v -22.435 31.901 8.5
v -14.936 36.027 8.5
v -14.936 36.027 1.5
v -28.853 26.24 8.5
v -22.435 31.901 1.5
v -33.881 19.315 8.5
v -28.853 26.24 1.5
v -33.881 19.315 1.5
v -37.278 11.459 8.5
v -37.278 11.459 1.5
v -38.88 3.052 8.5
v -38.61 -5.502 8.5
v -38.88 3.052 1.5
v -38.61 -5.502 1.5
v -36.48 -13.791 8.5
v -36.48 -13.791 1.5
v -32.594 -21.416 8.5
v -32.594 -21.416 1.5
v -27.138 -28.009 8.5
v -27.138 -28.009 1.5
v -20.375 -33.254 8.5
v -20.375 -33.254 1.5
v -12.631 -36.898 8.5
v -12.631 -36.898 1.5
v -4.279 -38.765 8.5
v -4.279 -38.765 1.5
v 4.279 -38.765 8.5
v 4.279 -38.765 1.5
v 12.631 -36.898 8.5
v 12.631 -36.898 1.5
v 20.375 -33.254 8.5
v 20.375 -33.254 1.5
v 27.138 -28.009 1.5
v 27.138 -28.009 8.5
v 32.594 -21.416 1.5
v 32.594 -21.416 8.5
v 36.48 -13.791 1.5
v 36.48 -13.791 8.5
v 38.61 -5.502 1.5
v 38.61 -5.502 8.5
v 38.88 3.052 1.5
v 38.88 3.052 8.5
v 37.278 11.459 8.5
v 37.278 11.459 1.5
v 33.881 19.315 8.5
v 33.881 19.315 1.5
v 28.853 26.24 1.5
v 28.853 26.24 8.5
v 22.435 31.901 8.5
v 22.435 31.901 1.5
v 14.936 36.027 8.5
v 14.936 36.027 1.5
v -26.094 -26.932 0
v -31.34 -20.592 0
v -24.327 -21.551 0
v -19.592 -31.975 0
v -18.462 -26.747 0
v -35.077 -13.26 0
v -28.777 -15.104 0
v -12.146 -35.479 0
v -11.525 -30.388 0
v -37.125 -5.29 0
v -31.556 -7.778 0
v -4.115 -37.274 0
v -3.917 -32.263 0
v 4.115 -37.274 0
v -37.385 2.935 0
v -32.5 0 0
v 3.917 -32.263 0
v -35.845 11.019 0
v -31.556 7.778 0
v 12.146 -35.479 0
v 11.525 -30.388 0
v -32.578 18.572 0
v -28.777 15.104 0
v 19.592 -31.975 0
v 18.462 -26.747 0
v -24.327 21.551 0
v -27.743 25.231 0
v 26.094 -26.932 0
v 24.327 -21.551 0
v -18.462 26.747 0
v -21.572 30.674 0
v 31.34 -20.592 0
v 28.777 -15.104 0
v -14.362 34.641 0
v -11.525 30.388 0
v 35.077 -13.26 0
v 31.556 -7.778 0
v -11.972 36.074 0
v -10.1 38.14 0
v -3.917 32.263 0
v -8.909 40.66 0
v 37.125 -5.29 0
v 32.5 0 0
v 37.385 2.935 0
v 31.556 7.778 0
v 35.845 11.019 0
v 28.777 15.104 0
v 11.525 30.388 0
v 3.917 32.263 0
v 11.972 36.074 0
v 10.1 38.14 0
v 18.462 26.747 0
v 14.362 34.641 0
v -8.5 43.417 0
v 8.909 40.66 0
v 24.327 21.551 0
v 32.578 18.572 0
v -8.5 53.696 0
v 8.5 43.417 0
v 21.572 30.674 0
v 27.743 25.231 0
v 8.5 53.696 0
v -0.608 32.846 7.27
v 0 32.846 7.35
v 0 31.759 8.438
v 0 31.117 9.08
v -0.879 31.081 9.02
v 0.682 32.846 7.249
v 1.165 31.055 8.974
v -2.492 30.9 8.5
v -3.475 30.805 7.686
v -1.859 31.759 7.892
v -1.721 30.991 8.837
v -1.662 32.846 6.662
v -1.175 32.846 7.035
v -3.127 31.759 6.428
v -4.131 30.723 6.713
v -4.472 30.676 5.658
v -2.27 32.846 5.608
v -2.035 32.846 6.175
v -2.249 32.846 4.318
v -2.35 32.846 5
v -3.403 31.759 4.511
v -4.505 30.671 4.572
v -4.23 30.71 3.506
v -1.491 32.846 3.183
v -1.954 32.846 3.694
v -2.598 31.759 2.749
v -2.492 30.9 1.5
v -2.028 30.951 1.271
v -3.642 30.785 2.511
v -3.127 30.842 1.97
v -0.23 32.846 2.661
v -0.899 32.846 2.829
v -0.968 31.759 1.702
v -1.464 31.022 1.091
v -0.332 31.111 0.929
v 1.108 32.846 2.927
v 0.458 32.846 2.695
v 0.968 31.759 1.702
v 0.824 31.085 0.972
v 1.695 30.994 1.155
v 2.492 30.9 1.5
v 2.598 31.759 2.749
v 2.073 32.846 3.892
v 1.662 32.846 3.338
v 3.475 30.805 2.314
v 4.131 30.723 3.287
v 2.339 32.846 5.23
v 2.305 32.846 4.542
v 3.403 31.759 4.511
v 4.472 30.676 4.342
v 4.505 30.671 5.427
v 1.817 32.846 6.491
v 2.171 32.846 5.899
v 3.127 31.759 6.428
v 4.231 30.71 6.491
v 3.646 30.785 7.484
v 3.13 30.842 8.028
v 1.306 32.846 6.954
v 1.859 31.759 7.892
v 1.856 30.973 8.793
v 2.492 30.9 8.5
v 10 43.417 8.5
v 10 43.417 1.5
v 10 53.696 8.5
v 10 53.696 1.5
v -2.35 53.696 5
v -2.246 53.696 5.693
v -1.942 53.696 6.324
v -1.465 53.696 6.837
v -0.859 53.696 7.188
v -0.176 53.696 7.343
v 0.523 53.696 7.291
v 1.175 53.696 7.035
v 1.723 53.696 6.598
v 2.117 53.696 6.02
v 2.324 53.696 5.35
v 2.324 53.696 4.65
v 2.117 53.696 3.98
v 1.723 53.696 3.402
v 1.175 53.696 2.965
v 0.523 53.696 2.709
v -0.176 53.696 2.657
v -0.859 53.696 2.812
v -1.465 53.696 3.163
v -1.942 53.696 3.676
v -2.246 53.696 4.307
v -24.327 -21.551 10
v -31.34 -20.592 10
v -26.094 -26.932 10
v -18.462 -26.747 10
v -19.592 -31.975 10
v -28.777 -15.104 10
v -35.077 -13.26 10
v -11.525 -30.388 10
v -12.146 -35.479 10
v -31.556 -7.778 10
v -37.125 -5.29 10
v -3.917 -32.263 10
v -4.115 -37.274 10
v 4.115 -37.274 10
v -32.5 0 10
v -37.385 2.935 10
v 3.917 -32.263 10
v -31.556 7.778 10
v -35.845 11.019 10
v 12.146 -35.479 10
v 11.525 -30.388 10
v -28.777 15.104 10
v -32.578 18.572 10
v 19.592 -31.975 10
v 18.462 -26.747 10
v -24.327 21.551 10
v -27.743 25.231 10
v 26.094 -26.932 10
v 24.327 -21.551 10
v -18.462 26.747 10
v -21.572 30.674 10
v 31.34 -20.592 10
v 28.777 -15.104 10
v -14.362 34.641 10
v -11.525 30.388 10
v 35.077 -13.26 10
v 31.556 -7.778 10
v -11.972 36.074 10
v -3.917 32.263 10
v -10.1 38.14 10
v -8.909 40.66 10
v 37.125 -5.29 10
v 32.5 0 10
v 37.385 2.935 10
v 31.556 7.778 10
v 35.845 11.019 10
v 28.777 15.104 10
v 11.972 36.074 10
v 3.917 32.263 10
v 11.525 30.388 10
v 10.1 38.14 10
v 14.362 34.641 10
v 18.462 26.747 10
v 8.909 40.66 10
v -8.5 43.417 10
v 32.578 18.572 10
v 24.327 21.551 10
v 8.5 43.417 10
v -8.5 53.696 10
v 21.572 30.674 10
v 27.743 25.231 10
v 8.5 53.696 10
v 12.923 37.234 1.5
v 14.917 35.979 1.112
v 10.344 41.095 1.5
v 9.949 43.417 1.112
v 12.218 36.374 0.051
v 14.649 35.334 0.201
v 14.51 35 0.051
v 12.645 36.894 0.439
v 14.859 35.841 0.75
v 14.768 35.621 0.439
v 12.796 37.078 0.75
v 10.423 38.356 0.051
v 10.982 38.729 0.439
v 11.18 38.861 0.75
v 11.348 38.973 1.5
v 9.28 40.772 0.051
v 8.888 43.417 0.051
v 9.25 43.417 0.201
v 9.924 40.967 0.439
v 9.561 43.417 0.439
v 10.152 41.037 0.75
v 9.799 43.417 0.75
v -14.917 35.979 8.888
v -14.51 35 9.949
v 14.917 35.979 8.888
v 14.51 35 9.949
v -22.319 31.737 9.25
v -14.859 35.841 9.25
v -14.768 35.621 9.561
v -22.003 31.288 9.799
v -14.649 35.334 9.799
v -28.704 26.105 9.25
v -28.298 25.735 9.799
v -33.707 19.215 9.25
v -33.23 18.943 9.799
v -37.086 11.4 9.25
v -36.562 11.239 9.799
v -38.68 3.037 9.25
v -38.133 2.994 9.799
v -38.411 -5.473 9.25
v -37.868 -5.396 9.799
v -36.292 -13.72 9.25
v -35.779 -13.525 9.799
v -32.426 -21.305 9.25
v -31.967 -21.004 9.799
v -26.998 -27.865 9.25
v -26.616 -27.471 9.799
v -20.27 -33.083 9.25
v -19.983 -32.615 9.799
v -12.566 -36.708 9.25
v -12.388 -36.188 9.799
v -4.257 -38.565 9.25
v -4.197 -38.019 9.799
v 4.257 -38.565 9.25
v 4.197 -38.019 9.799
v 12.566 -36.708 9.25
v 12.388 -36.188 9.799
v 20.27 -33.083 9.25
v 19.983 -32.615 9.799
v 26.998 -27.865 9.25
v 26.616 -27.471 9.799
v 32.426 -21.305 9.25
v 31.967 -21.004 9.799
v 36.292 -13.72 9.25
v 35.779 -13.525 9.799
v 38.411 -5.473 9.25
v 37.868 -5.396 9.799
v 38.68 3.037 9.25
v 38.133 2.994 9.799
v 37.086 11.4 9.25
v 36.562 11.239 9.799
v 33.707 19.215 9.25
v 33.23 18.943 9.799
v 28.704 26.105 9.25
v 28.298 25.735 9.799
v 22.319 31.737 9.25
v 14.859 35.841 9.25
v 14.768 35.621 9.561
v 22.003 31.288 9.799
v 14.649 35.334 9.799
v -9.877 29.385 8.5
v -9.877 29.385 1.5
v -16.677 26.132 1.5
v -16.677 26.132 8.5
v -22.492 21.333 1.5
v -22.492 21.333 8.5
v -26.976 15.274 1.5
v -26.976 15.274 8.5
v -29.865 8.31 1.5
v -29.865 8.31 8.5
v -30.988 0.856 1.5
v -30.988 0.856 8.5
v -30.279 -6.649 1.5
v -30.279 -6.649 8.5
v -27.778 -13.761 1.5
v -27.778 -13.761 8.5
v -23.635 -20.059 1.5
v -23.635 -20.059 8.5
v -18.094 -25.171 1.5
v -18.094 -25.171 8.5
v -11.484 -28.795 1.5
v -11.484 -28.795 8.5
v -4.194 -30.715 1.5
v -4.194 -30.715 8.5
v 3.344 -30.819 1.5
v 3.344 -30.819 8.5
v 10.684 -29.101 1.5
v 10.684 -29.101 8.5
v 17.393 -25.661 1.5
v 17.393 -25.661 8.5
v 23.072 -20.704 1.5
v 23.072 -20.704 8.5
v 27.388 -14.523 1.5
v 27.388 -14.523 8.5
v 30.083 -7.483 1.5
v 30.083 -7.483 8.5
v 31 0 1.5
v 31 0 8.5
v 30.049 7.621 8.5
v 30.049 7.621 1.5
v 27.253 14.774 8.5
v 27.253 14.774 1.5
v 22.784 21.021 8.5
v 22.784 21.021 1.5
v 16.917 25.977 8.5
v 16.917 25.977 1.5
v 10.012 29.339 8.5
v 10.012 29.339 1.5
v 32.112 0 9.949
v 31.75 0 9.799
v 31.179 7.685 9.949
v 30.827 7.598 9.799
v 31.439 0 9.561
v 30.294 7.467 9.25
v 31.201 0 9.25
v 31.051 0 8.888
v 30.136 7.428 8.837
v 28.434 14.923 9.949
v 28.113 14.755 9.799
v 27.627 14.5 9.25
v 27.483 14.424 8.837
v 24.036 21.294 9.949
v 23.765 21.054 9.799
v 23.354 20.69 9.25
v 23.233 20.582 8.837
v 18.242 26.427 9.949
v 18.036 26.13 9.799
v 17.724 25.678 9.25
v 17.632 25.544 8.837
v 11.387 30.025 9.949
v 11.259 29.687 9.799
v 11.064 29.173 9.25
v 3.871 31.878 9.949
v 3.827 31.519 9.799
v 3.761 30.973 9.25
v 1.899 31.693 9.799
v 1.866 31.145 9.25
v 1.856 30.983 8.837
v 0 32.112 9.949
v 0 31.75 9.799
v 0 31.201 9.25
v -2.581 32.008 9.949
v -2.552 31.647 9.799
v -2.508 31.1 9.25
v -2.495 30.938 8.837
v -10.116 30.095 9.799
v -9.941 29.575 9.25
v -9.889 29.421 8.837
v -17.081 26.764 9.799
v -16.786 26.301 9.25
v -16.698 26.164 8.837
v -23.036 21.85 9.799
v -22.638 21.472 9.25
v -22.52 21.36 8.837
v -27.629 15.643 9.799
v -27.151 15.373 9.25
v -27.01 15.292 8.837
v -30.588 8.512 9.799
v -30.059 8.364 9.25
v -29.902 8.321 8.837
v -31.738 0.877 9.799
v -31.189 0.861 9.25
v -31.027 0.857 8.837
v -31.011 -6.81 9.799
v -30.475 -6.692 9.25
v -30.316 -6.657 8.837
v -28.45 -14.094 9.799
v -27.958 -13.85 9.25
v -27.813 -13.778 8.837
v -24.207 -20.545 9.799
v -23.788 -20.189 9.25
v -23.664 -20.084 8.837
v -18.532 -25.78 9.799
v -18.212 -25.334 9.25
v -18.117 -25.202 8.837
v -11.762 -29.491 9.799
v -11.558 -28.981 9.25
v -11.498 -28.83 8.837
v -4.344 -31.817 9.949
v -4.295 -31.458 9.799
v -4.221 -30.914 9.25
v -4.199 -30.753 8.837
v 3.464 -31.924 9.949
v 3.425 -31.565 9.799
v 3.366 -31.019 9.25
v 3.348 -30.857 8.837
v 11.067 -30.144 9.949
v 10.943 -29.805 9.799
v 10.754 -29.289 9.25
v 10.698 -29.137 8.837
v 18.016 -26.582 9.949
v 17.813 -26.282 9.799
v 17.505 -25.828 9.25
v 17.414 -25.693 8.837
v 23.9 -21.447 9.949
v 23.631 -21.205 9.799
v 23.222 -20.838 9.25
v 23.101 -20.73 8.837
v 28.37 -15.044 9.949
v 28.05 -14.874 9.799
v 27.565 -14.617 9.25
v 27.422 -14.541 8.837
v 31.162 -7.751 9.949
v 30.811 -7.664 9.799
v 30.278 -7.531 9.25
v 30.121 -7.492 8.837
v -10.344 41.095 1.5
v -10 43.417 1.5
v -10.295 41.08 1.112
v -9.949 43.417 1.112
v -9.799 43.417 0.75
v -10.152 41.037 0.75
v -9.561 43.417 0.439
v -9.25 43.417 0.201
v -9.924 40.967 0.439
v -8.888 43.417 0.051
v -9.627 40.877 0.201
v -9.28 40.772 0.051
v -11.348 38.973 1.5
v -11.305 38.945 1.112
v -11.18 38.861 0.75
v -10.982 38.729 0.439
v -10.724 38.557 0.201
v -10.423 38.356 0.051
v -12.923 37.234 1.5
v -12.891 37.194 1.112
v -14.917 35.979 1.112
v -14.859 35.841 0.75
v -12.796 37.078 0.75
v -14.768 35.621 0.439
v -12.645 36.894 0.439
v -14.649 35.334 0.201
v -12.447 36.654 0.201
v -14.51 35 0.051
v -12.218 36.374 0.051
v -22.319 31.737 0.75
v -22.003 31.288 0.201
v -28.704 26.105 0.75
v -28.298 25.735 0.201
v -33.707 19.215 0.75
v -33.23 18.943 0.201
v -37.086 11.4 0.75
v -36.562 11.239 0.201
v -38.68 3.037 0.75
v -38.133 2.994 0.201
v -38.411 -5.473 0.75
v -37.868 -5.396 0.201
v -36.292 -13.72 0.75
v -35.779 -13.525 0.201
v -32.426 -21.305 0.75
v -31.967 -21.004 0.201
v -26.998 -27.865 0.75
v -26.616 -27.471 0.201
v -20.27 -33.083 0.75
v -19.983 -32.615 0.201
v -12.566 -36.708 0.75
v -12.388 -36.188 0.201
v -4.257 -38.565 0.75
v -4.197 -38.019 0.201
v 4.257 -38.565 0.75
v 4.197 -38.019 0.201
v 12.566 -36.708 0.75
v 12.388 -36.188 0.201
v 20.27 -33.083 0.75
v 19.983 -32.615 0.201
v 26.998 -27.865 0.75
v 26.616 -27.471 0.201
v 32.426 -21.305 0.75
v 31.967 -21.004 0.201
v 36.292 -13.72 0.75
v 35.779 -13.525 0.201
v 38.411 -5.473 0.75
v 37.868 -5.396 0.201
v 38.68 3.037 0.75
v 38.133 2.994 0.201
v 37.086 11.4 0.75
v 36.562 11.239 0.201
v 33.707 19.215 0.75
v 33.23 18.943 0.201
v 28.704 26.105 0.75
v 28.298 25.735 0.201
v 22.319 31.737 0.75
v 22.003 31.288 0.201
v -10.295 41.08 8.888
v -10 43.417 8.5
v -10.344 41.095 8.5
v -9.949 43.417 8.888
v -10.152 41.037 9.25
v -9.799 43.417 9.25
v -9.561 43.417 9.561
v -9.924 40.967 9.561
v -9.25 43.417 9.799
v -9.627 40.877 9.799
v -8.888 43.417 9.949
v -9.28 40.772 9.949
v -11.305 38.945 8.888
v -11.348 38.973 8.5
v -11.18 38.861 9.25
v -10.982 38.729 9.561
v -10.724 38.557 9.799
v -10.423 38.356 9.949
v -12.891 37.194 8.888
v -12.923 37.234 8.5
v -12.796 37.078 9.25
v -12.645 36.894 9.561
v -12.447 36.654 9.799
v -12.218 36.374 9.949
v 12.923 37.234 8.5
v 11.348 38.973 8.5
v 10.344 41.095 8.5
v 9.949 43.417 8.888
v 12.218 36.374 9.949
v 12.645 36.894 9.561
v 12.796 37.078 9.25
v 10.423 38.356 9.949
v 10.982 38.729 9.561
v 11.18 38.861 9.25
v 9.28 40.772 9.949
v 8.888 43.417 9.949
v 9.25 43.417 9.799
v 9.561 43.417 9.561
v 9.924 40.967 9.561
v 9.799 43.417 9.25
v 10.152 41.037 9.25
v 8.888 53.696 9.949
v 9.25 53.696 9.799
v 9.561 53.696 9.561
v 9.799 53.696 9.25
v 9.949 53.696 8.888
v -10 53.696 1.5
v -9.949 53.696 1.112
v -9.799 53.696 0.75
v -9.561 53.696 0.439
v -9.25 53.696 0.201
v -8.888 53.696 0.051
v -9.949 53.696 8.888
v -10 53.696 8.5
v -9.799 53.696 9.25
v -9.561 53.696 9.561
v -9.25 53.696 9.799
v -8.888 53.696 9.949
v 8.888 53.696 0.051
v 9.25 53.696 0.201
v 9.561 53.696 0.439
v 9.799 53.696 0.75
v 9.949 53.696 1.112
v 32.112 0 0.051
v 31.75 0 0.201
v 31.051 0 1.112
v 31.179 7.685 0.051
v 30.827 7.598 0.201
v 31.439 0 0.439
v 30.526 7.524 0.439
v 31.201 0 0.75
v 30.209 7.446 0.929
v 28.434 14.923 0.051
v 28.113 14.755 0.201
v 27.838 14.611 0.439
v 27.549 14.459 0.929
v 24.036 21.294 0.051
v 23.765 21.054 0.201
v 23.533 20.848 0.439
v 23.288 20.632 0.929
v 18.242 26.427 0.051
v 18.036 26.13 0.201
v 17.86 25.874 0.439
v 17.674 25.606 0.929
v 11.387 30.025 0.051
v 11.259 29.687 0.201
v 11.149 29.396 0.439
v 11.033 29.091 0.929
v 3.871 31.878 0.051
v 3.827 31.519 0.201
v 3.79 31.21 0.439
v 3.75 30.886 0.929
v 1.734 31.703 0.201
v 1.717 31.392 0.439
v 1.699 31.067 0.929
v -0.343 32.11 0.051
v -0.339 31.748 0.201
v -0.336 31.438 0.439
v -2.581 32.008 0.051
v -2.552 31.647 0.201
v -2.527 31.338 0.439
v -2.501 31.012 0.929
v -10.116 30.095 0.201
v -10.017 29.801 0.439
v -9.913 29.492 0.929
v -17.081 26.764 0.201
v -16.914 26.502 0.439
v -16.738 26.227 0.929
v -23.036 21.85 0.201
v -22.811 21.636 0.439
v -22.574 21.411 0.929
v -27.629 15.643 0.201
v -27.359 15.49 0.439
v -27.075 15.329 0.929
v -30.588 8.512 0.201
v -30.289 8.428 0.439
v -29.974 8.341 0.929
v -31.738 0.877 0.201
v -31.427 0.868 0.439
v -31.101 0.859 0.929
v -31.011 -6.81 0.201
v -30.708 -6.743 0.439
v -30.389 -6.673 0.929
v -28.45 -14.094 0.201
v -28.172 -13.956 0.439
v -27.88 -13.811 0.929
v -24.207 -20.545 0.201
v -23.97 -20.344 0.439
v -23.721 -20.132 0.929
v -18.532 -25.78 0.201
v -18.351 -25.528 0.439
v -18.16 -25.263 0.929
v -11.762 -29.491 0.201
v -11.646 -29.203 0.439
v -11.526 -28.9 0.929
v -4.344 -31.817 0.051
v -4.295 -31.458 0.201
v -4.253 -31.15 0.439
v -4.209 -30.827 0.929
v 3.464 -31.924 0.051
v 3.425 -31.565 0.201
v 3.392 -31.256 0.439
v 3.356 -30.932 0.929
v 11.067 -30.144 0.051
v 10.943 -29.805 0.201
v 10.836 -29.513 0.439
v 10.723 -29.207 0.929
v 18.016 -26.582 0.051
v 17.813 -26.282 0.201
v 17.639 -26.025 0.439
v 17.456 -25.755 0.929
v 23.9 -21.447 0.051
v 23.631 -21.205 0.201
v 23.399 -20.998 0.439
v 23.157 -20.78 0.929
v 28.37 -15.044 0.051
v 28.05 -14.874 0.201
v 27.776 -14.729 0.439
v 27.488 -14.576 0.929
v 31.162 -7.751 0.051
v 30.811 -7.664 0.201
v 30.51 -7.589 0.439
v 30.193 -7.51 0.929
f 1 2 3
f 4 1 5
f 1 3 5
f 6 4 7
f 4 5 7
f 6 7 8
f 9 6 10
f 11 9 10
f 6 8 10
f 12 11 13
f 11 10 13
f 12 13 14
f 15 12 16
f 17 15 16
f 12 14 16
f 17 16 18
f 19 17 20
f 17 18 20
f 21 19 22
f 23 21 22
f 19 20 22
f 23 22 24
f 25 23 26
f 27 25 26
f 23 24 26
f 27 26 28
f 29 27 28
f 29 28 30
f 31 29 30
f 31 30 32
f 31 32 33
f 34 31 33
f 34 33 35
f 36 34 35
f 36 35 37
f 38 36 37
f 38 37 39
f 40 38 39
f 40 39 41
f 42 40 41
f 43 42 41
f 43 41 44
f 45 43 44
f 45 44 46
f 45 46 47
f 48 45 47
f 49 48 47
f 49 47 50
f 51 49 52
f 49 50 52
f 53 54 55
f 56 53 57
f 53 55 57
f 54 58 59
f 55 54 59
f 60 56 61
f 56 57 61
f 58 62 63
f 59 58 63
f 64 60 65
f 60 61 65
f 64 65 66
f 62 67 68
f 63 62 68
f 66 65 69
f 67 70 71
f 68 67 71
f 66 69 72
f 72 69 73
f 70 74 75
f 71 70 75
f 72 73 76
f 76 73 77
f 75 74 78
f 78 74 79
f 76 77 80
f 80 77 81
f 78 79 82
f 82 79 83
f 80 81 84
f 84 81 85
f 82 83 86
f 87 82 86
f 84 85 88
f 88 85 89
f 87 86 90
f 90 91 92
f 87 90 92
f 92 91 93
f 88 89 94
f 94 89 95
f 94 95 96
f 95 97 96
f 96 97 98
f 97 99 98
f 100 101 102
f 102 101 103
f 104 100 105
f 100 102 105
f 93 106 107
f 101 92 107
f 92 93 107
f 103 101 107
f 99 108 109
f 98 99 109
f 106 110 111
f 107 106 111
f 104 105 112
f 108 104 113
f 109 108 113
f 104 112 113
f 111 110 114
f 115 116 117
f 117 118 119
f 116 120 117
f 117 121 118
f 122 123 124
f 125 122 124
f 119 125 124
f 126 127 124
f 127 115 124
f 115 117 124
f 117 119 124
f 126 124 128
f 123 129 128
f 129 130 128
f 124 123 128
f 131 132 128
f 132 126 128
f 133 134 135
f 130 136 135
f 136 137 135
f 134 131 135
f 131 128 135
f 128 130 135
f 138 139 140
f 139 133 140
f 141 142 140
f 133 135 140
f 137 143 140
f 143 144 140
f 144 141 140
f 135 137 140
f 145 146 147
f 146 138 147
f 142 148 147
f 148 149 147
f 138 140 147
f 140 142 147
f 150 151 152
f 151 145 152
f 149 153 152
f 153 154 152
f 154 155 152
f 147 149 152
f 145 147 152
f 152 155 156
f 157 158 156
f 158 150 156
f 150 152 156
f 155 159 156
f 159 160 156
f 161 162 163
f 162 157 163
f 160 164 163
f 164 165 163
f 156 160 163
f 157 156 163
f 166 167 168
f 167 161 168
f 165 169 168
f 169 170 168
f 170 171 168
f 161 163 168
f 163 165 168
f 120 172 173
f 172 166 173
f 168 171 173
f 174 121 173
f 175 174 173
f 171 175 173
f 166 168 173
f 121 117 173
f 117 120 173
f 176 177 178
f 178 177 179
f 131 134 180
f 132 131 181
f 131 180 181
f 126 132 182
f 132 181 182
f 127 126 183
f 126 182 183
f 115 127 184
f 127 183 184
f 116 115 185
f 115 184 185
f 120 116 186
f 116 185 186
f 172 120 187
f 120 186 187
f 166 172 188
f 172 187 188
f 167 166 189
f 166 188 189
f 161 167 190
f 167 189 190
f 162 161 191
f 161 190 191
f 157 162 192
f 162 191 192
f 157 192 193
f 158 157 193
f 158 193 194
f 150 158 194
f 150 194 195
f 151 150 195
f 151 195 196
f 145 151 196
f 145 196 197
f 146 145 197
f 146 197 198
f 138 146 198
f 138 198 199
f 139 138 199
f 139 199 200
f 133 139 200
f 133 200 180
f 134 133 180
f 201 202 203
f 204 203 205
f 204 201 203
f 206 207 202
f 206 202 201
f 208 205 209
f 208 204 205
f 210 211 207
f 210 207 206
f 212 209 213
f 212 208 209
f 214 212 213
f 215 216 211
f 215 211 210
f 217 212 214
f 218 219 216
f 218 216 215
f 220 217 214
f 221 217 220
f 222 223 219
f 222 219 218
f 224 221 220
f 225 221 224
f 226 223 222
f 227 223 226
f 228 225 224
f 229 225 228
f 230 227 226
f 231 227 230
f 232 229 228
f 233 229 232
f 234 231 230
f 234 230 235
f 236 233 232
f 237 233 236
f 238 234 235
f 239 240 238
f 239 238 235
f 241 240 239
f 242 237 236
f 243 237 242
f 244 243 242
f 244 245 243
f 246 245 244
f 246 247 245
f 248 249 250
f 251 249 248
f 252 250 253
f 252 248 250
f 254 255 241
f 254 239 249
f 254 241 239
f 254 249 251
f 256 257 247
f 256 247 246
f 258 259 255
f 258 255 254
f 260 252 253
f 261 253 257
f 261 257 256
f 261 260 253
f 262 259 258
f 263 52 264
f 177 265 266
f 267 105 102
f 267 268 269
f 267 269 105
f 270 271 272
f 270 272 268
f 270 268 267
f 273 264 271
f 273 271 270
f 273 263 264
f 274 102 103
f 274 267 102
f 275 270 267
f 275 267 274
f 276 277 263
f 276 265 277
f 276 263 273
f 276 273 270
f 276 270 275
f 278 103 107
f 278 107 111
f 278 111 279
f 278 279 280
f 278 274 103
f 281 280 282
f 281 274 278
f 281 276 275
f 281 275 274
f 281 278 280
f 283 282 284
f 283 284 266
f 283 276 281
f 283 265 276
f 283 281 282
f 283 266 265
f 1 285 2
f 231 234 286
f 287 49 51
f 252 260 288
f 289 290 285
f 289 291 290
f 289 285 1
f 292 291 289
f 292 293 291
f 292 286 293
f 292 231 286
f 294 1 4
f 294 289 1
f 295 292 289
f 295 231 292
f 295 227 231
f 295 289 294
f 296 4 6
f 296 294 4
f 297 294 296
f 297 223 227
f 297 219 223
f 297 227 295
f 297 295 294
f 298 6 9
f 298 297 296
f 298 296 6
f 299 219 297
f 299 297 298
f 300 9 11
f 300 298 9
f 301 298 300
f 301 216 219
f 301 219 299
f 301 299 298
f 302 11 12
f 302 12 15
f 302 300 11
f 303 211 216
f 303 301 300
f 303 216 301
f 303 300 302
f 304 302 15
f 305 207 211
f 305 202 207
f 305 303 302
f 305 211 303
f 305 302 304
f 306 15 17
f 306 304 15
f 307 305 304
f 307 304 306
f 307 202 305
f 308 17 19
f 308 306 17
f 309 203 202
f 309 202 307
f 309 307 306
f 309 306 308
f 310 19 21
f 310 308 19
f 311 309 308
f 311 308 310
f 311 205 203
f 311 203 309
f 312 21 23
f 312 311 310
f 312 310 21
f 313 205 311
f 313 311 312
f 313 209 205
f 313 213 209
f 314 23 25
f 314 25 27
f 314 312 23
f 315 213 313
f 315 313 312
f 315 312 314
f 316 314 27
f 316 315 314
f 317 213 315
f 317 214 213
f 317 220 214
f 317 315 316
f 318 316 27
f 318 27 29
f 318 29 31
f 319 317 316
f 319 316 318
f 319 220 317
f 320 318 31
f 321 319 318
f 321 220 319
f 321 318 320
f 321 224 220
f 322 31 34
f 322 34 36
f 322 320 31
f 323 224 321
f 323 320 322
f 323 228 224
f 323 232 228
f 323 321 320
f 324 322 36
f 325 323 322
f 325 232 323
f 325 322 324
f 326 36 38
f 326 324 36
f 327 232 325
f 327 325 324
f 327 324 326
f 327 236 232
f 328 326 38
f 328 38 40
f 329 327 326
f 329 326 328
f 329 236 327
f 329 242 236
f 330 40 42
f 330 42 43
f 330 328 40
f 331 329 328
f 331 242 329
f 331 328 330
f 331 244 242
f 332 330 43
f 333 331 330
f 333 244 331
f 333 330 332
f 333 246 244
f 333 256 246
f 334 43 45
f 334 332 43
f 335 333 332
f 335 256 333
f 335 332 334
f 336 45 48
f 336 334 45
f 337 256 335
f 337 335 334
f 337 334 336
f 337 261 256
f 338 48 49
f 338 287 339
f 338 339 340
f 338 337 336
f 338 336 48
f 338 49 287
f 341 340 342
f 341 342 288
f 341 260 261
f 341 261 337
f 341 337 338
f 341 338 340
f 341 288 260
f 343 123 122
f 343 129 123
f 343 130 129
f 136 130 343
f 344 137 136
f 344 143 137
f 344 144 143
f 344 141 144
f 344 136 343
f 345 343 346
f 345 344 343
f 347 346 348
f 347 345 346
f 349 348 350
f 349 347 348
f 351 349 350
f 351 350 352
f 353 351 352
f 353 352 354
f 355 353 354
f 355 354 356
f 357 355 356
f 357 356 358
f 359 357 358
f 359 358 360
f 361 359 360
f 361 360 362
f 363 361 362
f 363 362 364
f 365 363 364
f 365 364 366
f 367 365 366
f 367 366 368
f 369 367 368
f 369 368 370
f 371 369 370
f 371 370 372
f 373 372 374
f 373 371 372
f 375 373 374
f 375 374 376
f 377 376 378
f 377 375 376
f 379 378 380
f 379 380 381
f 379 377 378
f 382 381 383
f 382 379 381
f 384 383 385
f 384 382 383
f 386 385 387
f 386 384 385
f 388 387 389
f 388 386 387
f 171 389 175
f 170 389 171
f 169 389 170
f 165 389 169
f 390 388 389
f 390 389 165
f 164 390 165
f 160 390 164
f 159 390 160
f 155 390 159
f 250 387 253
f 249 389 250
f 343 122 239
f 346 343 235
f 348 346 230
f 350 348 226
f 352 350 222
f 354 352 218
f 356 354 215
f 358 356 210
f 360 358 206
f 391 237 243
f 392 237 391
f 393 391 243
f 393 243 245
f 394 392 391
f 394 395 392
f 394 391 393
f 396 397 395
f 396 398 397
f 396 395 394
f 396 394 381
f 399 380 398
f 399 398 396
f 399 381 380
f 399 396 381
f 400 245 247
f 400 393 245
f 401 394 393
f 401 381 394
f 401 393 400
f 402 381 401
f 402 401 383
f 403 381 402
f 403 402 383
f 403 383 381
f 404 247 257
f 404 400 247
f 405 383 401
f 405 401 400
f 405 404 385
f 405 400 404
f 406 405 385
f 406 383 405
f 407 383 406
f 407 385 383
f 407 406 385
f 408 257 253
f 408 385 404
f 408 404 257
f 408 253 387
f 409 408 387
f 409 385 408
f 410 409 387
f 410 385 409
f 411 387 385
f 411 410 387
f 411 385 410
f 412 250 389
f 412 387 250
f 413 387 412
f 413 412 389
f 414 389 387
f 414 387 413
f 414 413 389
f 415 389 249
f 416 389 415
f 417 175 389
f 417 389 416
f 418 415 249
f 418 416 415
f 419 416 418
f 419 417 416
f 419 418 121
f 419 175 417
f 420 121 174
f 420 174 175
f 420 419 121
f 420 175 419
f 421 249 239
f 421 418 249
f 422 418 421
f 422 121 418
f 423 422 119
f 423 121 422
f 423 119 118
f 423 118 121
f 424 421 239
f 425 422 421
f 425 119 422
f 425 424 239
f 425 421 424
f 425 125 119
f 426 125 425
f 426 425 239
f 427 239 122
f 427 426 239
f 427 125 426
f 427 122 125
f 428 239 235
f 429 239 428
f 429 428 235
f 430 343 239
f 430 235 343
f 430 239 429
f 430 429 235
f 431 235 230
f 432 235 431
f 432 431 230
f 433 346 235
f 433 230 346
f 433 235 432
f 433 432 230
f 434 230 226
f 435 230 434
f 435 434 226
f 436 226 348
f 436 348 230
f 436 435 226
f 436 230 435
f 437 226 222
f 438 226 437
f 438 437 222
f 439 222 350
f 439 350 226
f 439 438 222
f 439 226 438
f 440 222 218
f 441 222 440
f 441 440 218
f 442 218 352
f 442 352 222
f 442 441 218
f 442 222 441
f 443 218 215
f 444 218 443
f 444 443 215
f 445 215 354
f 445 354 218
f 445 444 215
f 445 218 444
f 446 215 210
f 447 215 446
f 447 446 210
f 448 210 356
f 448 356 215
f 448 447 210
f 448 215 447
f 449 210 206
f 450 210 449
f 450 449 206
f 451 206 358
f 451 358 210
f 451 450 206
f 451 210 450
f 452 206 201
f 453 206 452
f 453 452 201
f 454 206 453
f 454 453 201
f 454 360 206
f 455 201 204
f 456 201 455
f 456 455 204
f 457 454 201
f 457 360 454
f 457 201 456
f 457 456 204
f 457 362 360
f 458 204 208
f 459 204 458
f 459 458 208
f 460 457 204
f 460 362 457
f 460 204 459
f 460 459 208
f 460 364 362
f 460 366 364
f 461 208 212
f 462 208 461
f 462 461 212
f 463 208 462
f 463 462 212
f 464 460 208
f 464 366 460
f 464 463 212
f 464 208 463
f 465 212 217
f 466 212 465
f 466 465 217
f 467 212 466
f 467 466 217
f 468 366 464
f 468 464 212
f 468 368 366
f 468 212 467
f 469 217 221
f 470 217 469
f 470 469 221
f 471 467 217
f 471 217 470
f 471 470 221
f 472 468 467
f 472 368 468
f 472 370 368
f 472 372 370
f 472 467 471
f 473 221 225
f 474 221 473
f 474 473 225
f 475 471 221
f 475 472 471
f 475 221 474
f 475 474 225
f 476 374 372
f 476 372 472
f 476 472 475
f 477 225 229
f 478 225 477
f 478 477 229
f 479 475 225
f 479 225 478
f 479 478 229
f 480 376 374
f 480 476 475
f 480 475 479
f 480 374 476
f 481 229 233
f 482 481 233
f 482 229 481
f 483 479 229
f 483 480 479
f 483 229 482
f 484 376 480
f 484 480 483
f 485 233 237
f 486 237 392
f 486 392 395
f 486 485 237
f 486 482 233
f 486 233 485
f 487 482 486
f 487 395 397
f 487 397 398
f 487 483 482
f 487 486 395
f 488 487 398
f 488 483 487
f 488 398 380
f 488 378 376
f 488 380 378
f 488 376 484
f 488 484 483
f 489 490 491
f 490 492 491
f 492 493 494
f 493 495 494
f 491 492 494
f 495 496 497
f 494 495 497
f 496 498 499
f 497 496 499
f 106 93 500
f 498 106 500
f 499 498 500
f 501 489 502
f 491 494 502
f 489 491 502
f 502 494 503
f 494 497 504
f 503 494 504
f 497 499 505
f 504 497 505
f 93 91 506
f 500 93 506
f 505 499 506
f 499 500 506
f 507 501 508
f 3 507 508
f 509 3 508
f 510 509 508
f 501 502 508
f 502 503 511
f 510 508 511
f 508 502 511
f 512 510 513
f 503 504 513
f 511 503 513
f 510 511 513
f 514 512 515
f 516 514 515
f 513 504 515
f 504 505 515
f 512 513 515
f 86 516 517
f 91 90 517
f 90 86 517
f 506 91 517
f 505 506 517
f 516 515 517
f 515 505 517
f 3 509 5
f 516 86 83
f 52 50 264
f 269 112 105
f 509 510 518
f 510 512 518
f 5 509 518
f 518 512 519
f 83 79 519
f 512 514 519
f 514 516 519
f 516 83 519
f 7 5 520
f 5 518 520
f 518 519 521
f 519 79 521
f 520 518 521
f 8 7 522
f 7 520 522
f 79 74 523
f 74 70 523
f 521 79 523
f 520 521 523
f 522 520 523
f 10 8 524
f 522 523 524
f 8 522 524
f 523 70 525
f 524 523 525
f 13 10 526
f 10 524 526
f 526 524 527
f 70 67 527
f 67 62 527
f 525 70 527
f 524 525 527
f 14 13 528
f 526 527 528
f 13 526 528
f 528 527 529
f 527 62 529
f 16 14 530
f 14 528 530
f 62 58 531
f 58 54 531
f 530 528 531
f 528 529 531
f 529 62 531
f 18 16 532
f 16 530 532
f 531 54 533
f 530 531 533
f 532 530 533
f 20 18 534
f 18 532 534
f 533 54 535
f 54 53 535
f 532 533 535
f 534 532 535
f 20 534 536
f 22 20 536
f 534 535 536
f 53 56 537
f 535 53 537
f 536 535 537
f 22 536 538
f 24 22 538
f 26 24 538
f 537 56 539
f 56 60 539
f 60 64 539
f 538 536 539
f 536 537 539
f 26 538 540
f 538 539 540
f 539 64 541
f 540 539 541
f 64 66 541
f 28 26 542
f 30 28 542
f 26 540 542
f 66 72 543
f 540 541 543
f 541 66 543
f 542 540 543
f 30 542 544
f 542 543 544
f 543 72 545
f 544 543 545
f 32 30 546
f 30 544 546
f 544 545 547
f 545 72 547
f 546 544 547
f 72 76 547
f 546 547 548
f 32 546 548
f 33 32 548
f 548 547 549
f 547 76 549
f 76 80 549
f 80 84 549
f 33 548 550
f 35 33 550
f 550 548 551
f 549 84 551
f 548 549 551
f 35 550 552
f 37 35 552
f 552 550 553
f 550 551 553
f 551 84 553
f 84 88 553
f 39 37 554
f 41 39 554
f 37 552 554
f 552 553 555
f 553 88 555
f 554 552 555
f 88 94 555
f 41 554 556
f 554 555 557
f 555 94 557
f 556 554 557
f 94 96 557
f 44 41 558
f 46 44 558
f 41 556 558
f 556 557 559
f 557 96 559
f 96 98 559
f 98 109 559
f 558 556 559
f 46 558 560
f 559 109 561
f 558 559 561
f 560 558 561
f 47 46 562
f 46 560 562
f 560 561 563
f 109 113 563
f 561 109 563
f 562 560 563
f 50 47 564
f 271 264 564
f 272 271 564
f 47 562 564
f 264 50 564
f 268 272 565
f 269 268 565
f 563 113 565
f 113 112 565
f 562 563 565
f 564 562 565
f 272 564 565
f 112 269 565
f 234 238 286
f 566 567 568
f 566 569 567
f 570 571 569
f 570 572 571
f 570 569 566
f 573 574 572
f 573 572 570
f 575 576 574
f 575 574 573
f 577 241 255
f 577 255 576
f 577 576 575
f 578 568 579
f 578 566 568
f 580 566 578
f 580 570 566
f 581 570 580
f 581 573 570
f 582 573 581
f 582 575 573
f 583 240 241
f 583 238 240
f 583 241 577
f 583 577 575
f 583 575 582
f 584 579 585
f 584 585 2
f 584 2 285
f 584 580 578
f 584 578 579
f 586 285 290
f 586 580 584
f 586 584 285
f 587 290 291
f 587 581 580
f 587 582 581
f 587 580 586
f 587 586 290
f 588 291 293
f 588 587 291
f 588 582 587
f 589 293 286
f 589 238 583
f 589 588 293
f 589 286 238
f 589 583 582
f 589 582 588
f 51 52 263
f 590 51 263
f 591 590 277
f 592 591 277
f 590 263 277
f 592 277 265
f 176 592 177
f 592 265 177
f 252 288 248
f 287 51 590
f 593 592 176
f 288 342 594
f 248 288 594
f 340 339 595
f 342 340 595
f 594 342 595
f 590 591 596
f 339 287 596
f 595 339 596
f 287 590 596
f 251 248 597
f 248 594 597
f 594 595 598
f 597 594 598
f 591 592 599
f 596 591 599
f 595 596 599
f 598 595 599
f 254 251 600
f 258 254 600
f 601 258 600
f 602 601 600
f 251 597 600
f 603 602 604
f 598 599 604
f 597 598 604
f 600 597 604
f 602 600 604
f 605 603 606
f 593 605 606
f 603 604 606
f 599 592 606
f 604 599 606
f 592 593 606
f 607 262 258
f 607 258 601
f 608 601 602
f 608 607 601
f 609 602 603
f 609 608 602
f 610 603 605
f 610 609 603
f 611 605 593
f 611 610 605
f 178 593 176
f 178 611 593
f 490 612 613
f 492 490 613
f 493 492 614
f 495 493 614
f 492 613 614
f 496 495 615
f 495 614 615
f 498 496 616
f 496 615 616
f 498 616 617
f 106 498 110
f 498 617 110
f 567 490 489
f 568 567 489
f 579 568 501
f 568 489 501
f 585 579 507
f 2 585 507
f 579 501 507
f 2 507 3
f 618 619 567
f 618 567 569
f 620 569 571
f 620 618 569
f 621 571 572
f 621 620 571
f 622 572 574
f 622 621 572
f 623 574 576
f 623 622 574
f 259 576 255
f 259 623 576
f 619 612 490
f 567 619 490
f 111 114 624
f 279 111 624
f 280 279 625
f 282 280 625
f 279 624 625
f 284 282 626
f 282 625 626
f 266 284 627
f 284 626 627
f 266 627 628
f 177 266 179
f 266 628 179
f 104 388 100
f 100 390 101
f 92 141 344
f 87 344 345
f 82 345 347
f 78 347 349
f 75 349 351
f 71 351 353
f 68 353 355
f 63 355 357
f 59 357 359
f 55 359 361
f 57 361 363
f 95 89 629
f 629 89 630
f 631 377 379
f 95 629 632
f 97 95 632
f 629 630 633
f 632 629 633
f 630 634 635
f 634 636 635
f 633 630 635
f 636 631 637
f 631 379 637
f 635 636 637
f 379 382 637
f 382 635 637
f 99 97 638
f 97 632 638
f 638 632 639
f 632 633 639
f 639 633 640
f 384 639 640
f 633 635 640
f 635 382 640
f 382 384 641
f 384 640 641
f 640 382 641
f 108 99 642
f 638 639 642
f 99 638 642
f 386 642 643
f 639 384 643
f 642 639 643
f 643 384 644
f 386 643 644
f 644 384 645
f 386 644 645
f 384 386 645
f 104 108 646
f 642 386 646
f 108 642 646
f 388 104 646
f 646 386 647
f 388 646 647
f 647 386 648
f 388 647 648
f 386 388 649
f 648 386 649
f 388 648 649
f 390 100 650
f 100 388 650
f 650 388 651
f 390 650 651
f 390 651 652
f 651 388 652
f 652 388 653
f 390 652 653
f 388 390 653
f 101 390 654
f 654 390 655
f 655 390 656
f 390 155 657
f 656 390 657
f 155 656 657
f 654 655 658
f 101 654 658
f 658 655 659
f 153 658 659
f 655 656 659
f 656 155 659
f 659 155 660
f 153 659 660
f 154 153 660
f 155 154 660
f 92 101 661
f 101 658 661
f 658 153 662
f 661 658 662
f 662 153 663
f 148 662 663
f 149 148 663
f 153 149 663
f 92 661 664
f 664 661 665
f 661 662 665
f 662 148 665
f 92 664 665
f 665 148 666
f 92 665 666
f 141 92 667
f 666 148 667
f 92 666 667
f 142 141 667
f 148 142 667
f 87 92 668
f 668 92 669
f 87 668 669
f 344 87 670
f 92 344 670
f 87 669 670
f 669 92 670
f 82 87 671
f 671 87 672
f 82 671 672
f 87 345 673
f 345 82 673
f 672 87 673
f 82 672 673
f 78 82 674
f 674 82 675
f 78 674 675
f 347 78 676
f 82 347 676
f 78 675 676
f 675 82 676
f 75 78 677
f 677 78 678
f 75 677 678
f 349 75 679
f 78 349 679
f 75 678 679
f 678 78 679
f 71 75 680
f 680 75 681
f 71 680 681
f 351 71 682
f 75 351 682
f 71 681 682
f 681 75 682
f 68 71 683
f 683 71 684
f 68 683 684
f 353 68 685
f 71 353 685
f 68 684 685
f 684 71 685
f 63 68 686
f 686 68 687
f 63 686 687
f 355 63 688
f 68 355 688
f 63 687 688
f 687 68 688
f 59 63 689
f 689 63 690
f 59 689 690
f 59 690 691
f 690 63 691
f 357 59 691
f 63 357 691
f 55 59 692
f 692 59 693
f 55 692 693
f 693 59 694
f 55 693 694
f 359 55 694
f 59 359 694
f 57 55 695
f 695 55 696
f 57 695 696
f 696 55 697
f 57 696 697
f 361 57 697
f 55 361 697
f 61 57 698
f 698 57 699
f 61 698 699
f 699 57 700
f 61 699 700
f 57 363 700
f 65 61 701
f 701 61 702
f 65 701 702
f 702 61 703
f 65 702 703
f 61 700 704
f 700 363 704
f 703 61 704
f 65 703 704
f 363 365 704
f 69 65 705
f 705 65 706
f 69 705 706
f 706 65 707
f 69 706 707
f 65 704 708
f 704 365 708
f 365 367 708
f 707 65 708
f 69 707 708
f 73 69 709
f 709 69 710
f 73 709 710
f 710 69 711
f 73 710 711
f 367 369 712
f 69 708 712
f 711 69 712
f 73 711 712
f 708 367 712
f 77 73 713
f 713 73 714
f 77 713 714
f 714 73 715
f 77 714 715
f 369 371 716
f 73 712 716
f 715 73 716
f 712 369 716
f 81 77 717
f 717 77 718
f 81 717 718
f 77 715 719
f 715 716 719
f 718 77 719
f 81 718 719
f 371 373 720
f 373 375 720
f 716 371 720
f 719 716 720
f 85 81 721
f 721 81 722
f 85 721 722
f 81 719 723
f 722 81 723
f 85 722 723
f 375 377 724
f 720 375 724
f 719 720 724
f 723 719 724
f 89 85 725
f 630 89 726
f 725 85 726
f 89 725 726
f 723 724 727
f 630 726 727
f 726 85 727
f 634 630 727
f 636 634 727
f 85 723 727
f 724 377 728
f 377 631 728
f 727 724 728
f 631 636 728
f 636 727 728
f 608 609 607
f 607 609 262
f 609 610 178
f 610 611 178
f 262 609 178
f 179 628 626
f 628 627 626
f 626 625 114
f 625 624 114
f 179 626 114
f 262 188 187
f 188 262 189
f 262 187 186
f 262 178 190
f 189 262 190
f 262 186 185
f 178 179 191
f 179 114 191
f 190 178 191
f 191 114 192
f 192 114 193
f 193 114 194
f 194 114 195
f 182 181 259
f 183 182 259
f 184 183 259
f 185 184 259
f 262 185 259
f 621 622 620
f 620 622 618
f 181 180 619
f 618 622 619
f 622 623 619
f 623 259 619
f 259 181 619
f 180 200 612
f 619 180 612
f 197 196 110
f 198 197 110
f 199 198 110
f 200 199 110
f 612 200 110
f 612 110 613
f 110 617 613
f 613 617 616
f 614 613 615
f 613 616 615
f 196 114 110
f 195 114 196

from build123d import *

# Parameters (mm, degrees)
F0_R         = 31
F1_DEPTH     = 10
F2_R         = 2.35
F3_DEPTH     = 22.7863546661
F6_T1_DEPTH  = 14.0295669578
F6_T4_ANGLE  = 314.9633717383
F6_T6_ANGLE  = 314.9633717383
F6_T12_ANGLE = 67.4816858691
F6_T14_ANGLE = 67.4816858691
F6_T16_ANGLE = 67.4816858691
F6_T18_ANGLE = 67.4816858691


# Not quite as in the source:
# - a fillet or chamfer that OpenCascade refuses, or shapes differently, is made with other operations: its cross-section is extruded or revolved along the edge and cut away or added


with BuildPart() as f1:
    # F0 (on Top) → F1 (new body)
    with BuildSketch(Plane.XY):
        with BuildLine():
            ThreePointArc((-10, 43.4165866922), (-11.3475328525, 38.9730879748), (-14.9361702128, 36.0265293829))
            ThreePointArc((-14.9361702128, 36.0265293829), (0, -39), (14.9361702128, 36.0265293829))
            ThreePointArc((14.9361702128, 36.0265293829), (11.3475328525, 38.9730879748), (10, 43.4165866922))
            Line((10, 43.4165866922), (10, 53.6961536499))
            Line((10, 53.6961536499), (-10, 53.6961536499))
            Line((-10, 53.6961536499), (-10, 43.4165866922))
        make_face()
        Circle(F0_R, mode=Mode.SUBTRACT)
    extrude(amount=F1_DEPTH)

    # F2 (on face) → F3 (cut, through all)
    with BuildSketch(Plane(origin=(0, 53.6961536499, 0), x_dir=(-1, 0, 0), z_dir=(0, 1, 0))):
        with Locations((0, 5)):
            Circle(F2_R)
    extrude(amount=-F3_DEPTH, mode=Mode.SUBTRACT)

    # F4 (on Right) → F5 (revolve, cut)
    with BuildSketch(Plane.YZ):
        Polygon((35.1961536499, 5), (30.1961536499, 10), (30.1961536499, 5), align=None)
    revolve(axis=Axis((0, 32.6961536499, 5), (0, -1, 0)), mode=Mode.SUBTRACT)

    # F6: fillet of radius 1.5 on 12 edges, made by hand

    # F6_s2 → F6_t1 (cut)
    with BuildSketch(Plane.XZ.offset(-57.4461536499)):
        with BuildLine():
            ThreePointArc((-10, 1.5), (-9.5606601718, 0.4393398282), (-8.5, 0))
            Line((-8.5, 0), (-10, 0))
            Line((-10, 0), (-10, 1.5))
        make_face()
        with BuildLine():
            ThreePointArc((-10, 8.5), (-9.5606601718, 9.5606601718), (-8.5, 10))
            Line((-8.5, 10), (-10, 10))
            Line((-10, 10), (-10, 8.5))
        make_face()
        with BuildLine():
            ThreePointArc((8.5, 0), (9.5606601718, 0.4393398282), (10, 1.5))
            Line((10, 1.5), (10, 0))
            Line((10, 0), (8.5, 0))
        make_face()
        with BuildLine():
            ThreePointArc((8.5, 10), (9.5606601718, 9.5606601718), (10, 8.5))
            Line((10, 8.5), (10, 10))
            Line((10, 10), (8.5, 10))
        make_face()
    extrude(amount=F6_T1_DEPTH, mode=Mode.SUBTRACT)

    # F6_s3 → F6_t4 (revolve, cut)
    with BuildSketch(Plane(origin=(0, 0, 0), x_dir=(0, 0, 1), z_dir=(0.9237571637, 0.3829787234, 0))):
        with BuildLine():
            ThreePointArc((8.5, -39), (9.5606601718, -38.5606601718), (10, -37.5))
            Line((10, -37.5), (10, -39))
            Line((10, -39), (8.5, -39))
        make_face()
    revolve(axis=Axis((0, 0, 10), (0, 0, 1)), revolution_arc=F6_T4_ANGLE, mode=Mode.SUBTRACT)

    # F6_s5 → F6_t6 (revolve, cut)
    with BuildSketch(Plane(origin=(0, 0, 0), x_dir=(0, 0, 1), z_dir=(0.9237571637, 0.3829787234, 0))):
        with BuildLine():
            ThreePointArc((1.5, -39), (0.4393398282, -38.5606601718), (0, -37.5))
            Line((0, -37.5), (0, -39))
            Line((0, -39), (1.5, -39))
        make_face()
    revolve(axis=Axis((0, 0, 0), (0, 0, 1)), revolution_arc=F6_T6_ANGLE, mode=Mode.SUBTRACT)

    # F6_s7 → F6_t8 (revolve, cut)
    with BuildSketch(Plane.XZ):
        with BuildLine():
            ThreePointArc((32.5, 0), (31.4393398282, 0.4393398282), (31, 1.5))
            Line((31, 1.5), (31, 0))
            Line((31, 0), (32.5, 0))
        make_face()
    revolve(axis=Axis((0, 0, 0), (0, 0, 1)), mode=Mode.SUBTRACT)

    # F6_s9 → F6_t10 (revolve, cut)
    with BuildSketch(Plane.XZ):
        with BuildLine():
            ThreePointArc((32.5, 10), (31.4393398282, 9.5606601718), (31, 8.5))
            Line((31, 8.5), (31, 10))
            Line((31, 10), (32.5, 10))
        make_face()
    revolve(axis=Axis((0, 0, 10), (0, 0, 1)), mode=Mode.SUBTRACT)

    # F6_s11 → F6_t12 (revolve, cut)
    with BuildSketch(Plane.XZ.offset(-43.4165866922)):
        with BuildLine():
            ThreePointArc((-10, 1.5), (-9.5606601718, 0.4393398282), (-8.5, 0))
            Line((-8.5, 0), (-10, 0))
            Line((-10, 0), (-10, 1.5))
        make_face()
    revolve(axis=Axis((-18, 43.4165866922, 0), (0, 0, -1)), revolution_arc=F6_T12_ANGLE, mode=Mode.SUBTRACT)

    # F6_s13 → F6_t14 (revolve, cut)
    with BuildSketch(Plane.XZ.offset(-43.4165866922)):
        with BuildLine():
            ThreePointArc((-10, 8.5), (-9.5606601718, 9.5606601718), (-8.5, 10))
            Line((-8.5, 10), (-10, 10))
            Line((-10, 10), (-10, 8.5))
        make_face()
    revolve(axis=Axis((-18, 43.4165866922, 10), (0, 0, -1)), revolution_arc=F6_T14_ANGLE, mode=Mode.SUBTRACT)

    # F6_s15 → F6_t16 (revolve, cut)
    with BuildSketch(Plane(origin=(0, 0, 0), x_dir=(0, 0, 1), z_dir=(0.9237571637, -0.3829787234, 0))):
        with BuildLine():
            ThreePointArc((0, -37.5), (0.4393398282, -38.5606601718), (1.5, -39))
            Line((1.5, -39), (0, -39))
            Line((0, -39), (0, -37.5))
        make_face()
    revolve(axis=Axis((18, 43.4165866922, 0), (0, 0, -1)), revolution_arc=F6_T16_ANGLE, mode=Mode.SUBTRACT)

    # F6_s17 → F6_t18 (revolve, cut)
    with BuildSketch(Plane(origin=(0, 0, 0), x_dir=(0, 0, 1), z_dir=(0.9237571637, -0.3829787234, 0))):
        with BuildLine():
            ThreePointArc((10, -37.5), (9.5606601718, -38.5606601718), (8.5, -39))
            Line((8.5, -39), (10, -39))
            Line((10, -39), (10, -37.5))
        make_face()
    revolve(axis=Axis((18, 43.4165866922, 10), (0, 0, -1)), revolution_arc=F6_T18_ANGLE, mode=Mode.SUBTRACT)


solid = f1.part
